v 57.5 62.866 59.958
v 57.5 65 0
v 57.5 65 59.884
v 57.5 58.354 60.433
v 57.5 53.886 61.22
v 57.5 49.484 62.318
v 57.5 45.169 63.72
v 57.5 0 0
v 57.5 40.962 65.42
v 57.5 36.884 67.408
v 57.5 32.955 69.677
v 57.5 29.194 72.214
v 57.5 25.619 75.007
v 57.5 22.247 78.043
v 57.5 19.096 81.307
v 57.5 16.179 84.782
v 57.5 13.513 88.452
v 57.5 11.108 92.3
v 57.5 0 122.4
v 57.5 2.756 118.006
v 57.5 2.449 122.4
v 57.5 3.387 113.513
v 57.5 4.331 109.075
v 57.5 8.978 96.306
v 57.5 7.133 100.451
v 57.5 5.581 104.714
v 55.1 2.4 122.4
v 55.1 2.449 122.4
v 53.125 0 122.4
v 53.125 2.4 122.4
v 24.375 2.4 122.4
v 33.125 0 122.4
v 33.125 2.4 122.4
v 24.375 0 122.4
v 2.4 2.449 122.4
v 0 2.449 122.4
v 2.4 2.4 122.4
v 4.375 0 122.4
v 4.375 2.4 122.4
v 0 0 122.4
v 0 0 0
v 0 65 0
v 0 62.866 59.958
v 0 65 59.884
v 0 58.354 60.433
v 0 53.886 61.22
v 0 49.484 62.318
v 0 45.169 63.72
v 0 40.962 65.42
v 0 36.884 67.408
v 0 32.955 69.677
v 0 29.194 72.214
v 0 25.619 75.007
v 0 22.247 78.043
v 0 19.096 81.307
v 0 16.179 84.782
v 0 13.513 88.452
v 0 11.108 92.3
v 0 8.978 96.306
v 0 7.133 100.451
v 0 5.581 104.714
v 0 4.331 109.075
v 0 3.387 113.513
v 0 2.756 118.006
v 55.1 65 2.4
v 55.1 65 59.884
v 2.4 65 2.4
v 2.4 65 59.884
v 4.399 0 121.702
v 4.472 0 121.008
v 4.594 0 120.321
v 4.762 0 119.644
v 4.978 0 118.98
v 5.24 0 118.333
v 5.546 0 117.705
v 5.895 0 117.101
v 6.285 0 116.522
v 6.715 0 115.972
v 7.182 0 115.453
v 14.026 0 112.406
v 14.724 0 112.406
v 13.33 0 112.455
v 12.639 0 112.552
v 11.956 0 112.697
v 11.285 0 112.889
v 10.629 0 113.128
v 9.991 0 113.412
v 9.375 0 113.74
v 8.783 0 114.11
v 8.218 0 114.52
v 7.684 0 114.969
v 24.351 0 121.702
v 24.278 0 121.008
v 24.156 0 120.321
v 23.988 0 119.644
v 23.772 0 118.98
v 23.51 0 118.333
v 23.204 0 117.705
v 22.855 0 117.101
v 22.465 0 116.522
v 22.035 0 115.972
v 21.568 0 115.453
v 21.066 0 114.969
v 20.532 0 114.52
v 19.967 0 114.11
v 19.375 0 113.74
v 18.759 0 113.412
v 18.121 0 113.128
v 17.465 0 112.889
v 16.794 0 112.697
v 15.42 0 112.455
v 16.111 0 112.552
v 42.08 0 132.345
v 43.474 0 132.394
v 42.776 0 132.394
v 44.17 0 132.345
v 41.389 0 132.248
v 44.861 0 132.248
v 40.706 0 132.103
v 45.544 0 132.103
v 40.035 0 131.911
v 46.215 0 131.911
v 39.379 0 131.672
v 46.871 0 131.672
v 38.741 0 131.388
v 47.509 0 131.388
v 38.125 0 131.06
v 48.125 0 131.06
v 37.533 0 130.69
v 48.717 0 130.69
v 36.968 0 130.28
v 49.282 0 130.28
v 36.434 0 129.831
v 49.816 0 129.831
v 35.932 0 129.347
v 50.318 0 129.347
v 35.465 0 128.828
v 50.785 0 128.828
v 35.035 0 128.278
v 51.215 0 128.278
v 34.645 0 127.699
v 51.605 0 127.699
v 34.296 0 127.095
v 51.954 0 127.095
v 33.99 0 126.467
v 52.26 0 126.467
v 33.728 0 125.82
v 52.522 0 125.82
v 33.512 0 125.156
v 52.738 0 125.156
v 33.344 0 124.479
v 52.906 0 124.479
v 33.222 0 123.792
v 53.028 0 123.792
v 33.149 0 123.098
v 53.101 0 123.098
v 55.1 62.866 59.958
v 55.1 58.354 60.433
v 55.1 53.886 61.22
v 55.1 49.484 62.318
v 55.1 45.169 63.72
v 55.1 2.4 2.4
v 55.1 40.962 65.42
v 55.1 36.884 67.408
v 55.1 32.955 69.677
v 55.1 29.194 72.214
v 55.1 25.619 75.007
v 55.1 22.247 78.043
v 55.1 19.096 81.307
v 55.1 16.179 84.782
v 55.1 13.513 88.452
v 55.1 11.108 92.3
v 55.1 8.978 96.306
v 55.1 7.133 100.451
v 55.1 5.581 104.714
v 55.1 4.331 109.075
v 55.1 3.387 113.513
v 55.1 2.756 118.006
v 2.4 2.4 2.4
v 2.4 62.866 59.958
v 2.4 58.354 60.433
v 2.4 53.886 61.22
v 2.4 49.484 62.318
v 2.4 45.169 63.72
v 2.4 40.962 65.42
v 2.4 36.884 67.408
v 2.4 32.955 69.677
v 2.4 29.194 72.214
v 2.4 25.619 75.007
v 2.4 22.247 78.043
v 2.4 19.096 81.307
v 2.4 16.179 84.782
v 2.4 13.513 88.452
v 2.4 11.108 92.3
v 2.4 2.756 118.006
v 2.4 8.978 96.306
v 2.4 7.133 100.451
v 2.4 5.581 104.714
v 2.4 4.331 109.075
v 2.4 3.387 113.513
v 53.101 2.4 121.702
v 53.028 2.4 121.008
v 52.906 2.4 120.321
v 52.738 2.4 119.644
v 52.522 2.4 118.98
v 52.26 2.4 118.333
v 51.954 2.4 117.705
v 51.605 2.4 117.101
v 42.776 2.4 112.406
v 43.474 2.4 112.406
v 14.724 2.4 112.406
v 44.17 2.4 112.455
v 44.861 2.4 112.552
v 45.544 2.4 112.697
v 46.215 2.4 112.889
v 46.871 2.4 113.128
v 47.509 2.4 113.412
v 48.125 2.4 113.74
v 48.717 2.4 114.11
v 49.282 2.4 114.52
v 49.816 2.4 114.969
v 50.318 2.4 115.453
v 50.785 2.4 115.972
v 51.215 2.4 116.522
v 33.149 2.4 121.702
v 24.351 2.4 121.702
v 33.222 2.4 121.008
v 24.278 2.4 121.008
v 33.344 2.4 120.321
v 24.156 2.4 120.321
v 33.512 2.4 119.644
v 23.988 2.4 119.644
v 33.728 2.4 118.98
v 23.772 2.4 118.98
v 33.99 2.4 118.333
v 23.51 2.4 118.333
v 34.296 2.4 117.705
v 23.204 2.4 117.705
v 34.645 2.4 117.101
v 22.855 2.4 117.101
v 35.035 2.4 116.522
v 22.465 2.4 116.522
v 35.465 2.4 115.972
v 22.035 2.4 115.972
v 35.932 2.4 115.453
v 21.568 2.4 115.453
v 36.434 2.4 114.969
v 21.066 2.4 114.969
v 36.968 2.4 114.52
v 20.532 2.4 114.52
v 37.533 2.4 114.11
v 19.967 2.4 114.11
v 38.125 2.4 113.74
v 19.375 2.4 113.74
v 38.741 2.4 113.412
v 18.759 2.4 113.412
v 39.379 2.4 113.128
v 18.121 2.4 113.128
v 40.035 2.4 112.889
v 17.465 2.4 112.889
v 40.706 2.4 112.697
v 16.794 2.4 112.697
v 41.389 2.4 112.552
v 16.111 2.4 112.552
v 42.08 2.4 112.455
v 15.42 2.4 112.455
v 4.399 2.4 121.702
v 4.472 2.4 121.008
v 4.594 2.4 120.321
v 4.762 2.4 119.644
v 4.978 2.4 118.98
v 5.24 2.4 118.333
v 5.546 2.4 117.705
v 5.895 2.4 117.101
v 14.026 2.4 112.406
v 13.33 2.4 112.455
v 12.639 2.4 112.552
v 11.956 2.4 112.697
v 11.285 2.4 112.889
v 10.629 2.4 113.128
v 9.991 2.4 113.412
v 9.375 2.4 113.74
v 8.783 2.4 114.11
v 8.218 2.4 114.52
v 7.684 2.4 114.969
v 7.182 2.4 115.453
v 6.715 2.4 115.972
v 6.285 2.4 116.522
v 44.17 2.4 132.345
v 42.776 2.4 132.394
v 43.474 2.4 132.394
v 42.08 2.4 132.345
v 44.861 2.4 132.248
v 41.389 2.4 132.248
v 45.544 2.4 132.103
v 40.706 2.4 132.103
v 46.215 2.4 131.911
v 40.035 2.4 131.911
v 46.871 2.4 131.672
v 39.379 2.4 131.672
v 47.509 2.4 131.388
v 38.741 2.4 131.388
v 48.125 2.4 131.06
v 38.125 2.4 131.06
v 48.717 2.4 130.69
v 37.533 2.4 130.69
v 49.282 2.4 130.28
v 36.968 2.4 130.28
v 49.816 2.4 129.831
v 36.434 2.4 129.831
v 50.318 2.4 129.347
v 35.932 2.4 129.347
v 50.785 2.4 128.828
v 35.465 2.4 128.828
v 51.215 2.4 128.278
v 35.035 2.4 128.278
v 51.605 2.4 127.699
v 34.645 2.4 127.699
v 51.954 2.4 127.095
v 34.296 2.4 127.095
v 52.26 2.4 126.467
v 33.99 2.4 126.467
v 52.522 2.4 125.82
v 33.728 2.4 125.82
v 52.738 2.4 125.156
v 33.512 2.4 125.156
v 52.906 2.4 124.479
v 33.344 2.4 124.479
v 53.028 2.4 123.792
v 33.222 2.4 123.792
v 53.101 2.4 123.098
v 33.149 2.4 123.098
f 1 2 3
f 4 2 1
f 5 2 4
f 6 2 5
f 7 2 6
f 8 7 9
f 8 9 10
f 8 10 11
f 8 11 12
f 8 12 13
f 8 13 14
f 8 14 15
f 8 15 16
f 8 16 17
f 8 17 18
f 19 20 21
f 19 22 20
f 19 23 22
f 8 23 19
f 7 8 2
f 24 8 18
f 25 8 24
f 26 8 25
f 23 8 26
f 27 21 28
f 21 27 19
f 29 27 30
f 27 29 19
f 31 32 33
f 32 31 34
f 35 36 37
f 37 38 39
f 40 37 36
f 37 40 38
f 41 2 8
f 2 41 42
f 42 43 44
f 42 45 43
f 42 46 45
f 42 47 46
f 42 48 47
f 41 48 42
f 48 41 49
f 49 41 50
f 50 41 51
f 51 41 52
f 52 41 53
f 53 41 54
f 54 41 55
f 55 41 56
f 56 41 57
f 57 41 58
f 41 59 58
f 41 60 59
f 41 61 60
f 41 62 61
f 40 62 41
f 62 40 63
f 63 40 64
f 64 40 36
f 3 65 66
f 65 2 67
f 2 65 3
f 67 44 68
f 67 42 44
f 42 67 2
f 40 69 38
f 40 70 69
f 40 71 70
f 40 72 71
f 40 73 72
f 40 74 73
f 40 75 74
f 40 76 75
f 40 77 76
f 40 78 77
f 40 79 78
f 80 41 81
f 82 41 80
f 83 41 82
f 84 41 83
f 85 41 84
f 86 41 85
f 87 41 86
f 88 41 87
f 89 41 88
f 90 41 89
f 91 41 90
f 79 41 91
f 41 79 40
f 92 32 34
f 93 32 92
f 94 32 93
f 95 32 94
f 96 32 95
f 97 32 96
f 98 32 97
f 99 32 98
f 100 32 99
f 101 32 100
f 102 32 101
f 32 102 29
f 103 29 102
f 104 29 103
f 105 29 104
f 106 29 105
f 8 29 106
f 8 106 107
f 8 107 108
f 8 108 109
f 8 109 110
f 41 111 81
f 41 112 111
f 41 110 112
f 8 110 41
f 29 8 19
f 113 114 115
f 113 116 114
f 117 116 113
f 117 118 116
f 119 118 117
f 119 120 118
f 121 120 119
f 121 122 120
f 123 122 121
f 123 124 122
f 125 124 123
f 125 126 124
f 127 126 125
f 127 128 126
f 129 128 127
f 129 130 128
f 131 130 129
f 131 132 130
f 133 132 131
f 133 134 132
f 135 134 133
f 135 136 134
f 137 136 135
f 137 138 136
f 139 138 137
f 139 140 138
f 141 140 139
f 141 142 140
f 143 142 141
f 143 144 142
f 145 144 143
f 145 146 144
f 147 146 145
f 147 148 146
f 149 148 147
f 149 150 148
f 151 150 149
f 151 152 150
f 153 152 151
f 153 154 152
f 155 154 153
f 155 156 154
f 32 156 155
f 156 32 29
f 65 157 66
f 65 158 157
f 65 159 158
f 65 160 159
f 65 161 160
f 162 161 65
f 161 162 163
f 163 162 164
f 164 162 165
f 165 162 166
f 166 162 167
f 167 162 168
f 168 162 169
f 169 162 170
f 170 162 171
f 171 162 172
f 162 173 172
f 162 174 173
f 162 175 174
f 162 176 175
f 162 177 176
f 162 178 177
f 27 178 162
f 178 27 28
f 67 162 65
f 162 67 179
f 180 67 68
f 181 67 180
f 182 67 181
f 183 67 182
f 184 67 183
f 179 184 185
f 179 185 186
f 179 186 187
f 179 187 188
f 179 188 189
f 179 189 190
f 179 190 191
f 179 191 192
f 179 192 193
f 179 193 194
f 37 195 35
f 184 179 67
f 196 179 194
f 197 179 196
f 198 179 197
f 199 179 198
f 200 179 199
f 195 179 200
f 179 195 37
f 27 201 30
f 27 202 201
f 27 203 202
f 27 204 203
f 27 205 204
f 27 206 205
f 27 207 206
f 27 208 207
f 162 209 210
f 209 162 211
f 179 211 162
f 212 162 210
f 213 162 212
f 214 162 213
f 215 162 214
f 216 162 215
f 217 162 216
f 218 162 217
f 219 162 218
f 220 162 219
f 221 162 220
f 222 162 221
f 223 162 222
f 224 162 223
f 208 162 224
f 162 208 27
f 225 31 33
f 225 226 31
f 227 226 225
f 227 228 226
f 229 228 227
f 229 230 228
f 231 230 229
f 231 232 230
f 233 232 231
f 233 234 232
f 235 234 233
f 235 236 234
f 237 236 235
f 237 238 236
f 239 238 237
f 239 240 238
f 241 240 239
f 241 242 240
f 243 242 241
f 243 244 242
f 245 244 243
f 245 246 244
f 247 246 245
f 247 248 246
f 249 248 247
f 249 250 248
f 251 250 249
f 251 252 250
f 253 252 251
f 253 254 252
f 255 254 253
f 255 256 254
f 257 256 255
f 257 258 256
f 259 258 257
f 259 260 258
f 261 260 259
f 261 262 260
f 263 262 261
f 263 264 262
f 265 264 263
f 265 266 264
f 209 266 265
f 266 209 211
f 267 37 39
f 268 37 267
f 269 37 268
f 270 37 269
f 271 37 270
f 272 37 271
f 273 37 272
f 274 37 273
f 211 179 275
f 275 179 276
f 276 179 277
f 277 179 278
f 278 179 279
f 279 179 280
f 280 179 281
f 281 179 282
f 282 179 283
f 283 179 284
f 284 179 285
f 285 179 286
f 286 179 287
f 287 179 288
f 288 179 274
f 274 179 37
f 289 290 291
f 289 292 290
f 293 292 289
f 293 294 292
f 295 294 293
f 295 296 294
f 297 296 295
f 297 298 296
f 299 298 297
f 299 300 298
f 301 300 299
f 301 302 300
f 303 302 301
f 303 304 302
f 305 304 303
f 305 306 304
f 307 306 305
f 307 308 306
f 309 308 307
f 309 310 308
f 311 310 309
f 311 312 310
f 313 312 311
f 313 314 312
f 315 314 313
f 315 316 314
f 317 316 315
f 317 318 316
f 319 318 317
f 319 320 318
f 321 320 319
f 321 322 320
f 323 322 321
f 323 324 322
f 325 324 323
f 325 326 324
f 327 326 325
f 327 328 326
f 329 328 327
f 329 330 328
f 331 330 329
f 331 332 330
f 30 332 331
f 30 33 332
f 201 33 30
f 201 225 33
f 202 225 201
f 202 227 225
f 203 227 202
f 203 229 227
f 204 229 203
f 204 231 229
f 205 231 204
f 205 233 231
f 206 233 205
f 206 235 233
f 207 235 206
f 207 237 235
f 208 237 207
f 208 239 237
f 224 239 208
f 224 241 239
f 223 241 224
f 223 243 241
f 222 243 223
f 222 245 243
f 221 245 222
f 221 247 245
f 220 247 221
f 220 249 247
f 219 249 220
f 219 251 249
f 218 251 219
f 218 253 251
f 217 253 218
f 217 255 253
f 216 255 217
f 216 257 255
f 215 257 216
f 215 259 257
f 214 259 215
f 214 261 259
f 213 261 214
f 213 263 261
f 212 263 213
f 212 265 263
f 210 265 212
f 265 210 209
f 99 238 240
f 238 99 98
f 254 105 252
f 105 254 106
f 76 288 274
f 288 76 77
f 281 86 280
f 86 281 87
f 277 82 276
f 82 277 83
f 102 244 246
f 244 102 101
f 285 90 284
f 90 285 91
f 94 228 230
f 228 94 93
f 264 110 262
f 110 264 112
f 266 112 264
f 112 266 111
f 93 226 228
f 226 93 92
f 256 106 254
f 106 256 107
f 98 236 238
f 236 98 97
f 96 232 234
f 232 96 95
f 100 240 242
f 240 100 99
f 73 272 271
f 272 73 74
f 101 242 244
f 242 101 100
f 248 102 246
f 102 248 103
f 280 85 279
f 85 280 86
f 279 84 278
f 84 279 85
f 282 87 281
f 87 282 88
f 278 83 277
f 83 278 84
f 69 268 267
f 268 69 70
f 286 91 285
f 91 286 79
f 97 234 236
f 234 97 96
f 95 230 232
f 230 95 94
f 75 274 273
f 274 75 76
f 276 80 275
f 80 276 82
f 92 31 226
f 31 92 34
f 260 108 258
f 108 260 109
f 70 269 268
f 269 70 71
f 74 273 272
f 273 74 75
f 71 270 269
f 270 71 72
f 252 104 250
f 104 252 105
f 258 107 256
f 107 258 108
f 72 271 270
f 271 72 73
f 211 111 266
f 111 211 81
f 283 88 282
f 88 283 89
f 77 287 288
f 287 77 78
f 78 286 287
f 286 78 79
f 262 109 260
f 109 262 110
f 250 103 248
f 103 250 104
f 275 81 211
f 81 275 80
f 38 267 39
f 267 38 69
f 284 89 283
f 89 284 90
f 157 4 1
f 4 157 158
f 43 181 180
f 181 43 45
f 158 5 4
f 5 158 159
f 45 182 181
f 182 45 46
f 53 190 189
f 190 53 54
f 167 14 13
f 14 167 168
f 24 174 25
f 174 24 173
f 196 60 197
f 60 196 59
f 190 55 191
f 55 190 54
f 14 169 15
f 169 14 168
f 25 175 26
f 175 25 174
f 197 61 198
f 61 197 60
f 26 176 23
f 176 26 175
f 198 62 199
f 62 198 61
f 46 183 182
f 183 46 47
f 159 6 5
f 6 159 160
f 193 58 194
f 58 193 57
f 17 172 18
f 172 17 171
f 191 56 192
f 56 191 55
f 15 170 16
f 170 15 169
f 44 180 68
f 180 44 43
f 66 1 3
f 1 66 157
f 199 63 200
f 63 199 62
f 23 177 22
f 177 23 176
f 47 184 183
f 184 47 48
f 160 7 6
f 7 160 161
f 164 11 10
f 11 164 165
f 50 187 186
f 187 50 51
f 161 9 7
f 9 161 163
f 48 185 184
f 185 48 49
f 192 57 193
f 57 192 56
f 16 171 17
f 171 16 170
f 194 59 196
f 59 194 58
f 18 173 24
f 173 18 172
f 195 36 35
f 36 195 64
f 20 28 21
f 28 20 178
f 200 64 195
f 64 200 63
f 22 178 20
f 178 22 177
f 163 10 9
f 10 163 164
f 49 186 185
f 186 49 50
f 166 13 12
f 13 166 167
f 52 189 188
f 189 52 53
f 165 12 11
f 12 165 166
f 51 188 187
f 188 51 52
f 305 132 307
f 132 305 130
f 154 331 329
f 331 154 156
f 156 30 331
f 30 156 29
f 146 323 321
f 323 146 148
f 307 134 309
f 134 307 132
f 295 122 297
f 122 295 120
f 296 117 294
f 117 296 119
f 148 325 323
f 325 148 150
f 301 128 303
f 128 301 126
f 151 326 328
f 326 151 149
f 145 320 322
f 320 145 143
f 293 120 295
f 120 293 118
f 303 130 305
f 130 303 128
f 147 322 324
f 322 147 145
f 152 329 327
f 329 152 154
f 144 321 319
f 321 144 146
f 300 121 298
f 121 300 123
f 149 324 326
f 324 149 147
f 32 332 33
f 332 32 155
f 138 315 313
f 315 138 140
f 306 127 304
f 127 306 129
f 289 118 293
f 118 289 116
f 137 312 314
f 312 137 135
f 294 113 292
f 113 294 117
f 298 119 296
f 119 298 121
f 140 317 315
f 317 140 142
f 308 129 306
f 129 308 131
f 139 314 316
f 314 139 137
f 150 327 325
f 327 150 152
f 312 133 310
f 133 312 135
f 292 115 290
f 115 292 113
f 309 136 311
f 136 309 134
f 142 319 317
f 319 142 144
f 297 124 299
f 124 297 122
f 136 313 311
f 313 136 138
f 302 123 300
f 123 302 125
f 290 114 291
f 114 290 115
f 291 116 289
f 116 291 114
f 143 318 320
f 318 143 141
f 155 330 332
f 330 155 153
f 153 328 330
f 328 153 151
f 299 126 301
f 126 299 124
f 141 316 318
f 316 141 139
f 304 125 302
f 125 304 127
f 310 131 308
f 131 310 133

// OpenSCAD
$fa=4; // default minimum facet angle is now 0.5
$fs=0.05; // default minimum facet size is now 0.05 mm

wallThickness = 2.4;

width = 57.5;
height = 65;
minOpeningLen = 240;
length = minOpeningLen + (2 * wallThickness);

alignmentRad = 10;

union() {
  translate([width / 4 * 3, wallThickness, length / 2]) rotate([90, 0, 0]) cylinder(r = alignmentRad, h = wallThickness); 
  difference() {
    cube([width, height, length / 2]);
    translate([wallThickness, wallThickness, wallThickness]) cube([width - wallThickness * 2, height - wallThickness, length - wallThickness]);
    translate([width / 4, wallThickness, length / 2]) rotate([90, 0, 0]) cylinder(r = alignmentRad, h = wallThickness);
    translate([0, height + wallThickness, length / 2 + wallThickness]) rotate([0, 90, 0]) cylinder(h = width, r = height);
  }
}
